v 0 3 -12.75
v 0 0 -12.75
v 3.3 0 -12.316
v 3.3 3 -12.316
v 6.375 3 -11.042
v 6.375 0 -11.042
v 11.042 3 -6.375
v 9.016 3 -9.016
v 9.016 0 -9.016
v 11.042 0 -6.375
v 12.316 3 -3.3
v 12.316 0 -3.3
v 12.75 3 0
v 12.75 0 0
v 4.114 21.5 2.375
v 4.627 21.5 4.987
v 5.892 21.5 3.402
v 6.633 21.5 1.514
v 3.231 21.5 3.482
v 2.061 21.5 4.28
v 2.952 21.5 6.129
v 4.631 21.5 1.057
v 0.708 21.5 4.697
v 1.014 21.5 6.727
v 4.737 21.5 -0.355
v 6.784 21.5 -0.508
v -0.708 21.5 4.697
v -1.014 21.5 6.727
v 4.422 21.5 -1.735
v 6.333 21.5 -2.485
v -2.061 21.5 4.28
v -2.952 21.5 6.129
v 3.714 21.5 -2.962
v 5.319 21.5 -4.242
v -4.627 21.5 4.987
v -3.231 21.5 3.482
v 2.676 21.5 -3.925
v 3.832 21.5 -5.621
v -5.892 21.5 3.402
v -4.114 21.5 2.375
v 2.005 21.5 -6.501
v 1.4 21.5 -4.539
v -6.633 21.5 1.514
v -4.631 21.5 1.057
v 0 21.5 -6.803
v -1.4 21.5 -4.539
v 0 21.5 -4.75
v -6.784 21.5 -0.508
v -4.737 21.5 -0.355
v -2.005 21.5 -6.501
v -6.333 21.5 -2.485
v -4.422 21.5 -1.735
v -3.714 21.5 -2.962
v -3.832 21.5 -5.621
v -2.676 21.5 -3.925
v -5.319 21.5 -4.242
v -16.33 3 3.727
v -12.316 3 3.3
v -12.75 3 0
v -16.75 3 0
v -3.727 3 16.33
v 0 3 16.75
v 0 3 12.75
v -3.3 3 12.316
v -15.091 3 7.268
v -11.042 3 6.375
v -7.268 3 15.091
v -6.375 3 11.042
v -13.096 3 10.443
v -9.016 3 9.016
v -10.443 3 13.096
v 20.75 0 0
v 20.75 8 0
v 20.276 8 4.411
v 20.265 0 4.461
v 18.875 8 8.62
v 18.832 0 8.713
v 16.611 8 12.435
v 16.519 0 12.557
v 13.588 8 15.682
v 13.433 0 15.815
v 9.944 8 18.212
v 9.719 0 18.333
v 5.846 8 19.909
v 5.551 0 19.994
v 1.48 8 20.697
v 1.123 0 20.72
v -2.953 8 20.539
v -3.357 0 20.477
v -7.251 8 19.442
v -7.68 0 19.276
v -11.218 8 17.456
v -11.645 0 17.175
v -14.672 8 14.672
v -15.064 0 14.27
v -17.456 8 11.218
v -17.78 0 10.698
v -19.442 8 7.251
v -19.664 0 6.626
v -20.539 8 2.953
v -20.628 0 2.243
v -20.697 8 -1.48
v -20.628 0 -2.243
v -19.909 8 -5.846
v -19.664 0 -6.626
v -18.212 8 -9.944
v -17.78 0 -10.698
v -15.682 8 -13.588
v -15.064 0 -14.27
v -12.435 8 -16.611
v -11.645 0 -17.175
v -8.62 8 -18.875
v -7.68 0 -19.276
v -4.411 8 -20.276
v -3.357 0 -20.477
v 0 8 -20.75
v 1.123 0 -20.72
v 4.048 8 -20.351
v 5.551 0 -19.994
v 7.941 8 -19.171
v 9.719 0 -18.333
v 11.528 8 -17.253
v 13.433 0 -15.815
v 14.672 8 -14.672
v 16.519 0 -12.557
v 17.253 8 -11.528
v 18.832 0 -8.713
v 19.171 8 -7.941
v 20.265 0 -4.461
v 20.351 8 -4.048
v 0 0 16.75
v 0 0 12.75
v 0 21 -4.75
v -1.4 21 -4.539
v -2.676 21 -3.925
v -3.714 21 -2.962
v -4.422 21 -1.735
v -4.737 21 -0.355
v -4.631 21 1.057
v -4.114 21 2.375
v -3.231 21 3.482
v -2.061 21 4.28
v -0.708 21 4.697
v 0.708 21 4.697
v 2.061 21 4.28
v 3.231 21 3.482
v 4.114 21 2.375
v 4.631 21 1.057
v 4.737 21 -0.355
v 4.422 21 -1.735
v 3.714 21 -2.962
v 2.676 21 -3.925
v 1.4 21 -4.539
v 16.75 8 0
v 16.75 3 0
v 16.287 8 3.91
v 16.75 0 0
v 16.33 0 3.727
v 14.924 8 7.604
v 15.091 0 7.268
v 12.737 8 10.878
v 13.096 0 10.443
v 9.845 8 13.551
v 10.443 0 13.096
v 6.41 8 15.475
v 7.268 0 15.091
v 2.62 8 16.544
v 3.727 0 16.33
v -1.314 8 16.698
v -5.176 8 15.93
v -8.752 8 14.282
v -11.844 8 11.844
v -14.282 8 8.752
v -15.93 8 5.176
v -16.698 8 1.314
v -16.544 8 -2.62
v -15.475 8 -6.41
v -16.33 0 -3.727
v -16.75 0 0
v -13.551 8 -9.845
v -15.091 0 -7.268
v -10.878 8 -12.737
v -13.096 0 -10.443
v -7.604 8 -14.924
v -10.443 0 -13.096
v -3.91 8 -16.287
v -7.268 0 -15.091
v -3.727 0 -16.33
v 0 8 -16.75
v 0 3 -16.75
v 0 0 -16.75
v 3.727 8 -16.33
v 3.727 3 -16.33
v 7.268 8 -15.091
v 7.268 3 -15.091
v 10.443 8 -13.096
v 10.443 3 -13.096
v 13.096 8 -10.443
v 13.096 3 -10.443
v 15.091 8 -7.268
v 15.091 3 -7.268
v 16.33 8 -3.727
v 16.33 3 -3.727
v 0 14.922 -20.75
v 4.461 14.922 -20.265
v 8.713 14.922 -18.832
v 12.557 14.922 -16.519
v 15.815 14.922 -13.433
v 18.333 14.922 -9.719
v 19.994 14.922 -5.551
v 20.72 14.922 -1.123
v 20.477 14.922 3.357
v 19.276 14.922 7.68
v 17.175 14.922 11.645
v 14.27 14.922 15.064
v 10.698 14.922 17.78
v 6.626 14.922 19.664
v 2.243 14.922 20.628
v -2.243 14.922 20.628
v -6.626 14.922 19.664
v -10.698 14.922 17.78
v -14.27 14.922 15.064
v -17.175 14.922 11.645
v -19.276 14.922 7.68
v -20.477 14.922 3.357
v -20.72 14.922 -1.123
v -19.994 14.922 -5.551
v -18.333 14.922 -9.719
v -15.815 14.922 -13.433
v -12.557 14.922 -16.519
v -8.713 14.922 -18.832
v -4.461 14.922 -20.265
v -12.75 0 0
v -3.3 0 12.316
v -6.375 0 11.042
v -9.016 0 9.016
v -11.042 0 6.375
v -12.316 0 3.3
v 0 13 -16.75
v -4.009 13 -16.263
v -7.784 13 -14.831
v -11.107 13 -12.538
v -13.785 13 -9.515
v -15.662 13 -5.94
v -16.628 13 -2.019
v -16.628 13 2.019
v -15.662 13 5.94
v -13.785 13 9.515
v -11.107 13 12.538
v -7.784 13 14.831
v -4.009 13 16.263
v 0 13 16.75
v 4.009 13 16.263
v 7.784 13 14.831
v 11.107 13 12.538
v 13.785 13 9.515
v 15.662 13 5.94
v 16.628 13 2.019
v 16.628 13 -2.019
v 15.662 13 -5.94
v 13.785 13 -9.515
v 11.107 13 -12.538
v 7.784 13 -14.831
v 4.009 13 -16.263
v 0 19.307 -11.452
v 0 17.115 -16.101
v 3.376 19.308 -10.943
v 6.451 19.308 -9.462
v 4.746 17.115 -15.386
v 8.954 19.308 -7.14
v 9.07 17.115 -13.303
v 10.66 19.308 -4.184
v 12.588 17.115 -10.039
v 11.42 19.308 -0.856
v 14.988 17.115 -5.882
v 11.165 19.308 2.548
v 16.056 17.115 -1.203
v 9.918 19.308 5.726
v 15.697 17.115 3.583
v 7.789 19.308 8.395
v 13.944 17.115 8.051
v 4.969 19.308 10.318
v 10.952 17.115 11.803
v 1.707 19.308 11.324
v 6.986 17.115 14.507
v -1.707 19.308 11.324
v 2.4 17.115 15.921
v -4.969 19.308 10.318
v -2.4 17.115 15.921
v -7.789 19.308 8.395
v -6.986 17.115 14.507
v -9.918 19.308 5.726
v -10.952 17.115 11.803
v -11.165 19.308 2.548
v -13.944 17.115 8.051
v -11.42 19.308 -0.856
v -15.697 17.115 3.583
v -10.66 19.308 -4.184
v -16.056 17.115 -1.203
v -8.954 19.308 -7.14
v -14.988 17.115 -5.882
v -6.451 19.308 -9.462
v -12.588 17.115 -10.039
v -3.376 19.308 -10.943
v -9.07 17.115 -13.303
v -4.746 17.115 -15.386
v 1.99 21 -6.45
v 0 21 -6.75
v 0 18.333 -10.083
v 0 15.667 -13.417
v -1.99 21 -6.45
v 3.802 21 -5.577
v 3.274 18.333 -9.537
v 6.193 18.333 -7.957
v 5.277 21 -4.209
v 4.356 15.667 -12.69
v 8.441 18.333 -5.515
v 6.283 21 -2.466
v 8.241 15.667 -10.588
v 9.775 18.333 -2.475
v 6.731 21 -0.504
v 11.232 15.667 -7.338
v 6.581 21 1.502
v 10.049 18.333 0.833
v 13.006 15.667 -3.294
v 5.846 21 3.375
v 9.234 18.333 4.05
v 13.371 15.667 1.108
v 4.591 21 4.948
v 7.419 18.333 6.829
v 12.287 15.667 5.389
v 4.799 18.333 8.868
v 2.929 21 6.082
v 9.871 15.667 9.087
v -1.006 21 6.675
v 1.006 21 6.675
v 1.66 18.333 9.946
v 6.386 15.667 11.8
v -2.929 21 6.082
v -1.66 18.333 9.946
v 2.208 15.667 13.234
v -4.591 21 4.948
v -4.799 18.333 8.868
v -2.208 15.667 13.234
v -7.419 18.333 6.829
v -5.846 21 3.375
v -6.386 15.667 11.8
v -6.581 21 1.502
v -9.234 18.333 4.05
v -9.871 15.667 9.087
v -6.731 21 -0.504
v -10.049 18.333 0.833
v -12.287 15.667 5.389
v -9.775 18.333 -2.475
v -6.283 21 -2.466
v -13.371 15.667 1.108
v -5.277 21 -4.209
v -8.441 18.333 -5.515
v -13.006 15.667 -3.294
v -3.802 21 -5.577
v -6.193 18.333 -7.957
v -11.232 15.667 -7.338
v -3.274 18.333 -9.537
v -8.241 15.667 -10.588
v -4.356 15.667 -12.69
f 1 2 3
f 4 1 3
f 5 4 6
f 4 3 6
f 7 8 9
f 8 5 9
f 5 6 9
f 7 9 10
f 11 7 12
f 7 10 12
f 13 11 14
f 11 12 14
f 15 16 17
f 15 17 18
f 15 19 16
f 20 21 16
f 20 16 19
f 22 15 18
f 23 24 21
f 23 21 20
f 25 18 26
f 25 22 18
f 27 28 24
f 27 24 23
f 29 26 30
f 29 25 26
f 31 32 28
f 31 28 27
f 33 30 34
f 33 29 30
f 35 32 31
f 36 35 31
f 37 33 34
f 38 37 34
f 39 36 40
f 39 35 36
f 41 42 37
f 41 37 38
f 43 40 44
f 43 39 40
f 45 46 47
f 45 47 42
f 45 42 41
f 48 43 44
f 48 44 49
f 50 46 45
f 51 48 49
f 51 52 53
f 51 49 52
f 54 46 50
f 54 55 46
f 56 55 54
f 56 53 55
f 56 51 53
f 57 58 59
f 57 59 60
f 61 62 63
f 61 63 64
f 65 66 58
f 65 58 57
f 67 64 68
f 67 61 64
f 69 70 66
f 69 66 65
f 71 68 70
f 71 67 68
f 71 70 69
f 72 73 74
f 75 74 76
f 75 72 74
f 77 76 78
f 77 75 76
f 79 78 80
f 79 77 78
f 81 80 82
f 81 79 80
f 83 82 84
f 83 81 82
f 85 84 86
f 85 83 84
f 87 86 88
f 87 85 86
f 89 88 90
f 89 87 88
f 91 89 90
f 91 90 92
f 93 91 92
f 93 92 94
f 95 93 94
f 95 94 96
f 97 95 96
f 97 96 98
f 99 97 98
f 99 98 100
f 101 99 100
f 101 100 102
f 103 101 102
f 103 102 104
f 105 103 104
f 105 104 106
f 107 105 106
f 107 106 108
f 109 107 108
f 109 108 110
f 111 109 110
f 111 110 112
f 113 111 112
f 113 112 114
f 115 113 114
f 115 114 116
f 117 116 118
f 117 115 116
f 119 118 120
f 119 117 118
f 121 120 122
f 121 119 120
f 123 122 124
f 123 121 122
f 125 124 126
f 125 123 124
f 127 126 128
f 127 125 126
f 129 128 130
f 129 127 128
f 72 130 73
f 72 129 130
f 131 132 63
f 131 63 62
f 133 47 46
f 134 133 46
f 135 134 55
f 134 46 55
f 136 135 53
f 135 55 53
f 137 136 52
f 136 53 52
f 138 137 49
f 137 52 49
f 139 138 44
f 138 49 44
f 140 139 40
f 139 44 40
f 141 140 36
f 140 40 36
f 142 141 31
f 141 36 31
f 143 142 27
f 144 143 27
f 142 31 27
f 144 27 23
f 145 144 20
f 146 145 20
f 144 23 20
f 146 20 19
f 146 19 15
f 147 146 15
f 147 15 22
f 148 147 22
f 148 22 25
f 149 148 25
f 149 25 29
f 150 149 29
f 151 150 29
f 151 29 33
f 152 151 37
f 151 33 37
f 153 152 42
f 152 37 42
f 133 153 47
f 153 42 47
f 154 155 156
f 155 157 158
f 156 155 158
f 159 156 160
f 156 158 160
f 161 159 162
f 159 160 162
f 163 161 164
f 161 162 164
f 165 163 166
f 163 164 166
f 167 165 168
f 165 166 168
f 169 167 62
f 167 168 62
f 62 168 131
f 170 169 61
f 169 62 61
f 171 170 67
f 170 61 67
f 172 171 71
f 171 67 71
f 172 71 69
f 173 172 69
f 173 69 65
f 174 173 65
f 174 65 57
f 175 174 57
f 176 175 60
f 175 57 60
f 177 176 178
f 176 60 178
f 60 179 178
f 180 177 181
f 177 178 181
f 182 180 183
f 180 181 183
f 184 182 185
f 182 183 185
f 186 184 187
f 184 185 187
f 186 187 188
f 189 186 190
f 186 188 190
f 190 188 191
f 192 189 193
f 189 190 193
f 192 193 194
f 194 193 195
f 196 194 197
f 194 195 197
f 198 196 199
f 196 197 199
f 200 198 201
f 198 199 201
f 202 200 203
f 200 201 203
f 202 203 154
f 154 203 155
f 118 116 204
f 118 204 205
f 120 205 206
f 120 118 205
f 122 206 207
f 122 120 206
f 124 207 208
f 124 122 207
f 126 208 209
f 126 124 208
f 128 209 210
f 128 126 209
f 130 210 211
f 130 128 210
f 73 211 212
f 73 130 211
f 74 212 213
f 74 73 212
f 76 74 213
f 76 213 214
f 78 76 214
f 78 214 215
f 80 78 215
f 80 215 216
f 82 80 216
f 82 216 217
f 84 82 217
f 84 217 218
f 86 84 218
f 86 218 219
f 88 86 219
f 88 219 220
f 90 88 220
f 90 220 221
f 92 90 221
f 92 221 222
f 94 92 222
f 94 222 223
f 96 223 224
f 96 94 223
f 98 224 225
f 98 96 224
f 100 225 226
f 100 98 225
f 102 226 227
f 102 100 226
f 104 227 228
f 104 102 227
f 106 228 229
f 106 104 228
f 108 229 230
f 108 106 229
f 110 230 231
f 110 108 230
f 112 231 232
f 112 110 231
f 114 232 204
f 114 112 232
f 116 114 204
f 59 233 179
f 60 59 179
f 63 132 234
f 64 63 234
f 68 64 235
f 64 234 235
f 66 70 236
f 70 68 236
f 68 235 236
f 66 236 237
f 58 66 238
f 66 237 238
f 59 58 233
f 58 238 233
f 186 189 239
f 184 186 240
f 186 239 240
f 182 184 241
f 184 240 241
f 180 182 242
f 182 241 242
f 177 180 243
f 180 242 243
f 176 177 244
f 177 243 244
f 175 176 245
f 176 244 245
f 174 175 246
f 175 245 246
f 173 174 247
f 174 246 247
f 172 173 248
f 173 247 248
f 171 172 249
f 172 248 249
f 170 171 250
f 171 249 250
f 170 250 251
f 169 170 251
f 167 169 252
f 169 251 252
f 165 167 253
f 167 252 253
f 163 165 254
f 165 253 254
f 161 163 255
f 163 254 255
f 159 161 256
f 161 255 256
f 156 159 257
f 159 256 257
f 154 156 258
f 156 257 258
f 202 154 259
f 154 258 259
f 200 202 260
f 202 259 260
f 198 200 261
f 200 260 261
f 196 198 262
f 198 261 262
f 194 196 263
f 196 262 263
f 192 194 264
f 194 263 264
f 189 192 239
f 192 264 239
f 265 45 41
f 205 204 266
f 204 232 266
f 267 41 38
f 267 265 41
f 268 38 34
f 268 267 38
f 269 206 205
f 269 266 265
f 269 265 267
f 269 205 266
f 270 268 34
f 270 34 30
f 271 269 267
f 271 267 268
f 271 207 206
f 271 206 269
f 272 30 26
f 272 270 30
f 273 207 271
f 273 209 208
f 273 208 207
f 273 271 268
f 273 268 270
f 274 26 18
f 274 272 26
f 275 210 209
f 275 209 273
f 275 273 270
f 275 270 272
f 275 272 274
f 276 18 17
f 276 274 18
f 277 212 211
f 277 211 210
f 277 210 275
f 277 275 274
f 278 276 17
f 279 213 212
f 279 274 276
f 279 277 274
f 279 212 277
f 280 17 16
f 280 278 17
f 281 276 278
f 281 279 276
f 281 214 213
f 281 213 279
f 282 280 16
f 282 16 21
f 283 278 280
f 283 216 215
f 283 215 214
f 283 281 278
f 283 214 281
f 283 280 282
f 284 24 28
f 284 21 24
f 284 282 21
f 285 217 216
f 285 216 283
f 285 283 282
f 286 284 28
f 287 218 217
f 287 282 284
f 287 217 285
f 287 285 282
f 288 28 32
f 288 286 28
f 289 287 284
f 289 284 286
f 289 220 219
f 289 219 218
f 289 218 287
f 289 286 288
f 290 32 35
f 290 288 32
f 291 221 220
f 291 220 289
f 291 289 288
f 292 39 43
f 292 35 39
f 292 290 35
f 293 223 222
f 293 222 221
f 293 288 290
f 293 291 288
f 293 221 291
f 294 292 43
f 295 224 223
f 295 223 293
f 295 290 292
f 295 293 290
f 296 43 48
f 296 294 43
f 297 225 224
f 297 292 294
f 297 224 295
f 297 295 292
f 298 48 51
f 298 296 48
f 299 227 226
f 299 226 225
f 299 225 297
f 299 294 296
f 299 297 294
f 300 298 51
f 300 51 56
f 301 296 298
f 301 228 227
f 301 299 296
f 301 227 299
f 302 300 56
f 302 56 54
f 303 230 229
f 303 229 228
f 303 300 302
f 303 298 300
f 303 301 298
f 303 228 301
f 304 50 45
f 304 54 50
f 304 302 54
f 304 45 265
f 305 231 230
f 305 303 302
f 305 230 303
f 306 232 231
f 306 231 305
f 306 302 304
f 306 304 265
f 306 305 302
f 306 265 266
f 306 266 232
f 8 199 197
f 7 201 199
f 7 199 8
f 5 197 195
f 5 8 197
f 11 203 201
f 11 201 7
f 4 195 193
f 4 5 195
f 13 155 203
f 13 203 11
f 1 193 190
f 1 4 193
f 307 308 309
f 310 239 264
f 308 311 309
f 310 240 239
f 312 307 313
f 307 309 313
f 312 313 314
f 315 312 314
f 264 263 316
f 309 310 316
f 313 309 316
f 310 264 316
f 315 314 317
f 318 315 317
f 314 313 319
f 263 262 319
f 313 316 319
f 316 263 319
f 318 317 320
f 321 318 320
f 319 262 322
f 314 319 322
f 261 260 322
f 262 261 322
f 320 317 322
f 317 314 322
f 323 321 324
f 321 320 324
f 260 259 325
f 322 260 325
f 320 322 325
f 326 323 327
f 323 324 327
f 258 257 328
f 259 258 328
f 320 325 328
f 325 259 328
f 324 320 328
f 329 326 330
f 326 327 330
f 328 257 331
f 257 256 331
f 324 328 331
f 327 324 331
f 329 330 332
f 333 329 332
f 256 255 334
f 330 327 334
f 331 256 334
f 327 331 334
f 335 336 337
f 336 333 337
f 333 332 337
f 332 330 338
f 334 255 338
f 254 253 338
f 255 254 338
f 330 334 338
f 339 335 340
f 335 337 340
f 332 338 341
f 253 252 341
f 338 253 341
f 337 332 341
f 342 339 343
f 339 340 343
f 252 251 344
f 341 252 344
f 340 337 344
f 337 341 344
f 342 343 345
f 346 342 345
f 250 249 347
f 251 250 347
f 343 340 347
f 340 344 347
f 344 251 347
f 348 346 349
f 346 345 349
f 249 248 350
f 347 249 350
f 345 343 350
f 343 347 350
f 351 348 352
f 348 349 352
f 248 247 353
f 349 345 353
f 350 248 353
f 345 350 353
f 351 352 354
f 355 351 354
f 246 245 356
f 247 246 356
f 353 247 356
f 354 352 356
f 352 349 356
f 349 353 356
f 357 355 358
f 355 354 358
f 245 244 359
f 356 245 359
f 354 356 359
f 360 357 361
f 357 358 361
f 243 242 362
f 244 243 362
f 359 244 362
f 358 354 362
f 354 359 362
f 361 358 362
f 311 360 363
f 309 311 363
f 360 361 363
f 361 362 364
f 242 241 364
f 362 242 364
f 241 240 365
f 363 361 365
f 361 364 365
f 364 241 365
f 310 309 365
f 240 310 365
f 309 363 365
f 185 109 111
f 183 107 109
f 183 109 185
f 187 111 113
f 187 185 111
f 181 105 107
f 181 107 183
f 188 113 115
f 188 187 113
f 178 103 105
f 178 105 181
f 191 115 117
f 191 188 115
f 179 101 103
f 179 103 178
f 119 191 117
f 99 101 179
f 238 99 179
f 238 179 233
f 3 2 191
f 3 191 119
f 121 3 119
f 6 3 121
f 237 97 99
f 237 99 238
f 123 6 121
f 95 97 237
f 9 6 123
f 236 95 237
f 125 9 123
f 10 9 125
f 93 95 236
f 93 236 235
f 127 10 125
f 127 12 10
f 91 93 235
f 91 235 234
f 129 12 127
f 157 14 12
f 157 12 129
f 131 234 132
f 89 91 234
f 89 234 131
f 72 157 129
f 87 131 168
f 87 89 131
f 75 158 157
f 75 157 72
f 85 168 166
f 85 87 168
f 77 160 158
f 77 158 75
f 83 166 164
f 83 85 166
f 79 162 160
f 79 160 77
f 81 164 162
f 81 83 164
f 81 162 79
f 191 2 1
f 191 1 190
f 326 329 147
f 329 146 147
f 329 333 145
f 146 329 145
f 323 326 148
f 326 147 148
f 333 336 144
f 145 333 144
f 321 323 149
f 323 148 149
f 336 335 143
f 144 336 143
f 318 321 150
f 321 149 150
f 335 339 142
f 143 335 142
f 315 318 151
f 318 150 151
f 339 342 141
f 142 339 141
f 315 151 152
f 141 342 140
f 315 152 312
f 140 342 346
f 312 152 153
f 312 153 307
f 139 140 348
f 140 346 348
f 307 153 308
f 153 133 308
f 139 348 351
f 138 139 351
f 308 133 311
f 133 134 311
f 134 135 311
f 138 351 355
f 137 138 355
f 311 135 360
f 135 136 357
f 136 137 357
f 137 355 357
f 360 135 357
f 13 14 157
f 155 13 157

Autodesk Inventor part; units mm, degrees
ref_plane "YZ Plane" through (0, 0, 0) normal (1, 0, 0) x (0, 1, 0)
ref_plane "XZ Plane" through (0, 0, 0) normal (0, 1, 0) x (-1, 0, 0)
ref_plane "XY Plane" through (0, 0, 0) normal (0, 0, 1) x (1, 0, 0)
sketch "Sketch1" plane through (0, 0, 0) normal (0, 1, 0) x (-1, 0, 0)
  line L0 (-12.75, 0) -> (-16.75, 0)
  line L1 (0, 12.75) -> (0, 16.75)
  line L2 (0, -12.75) -> (0, -16.75)
  line L3 (12.75, 0) -> (16.75, 0)
  arc A0 (-12.75, 0) -> (0, -12.75) centre (0, 0) ccw
  arc A1 (12.75, 0) -> (0, 12.75) centre (0, 0) ccw
  arc A2 (-16.75, 0) -> (0, -16.75) centre (0, 0) ccw
  arc A3 (16.75, 0) -> (0, 16.75) centre (0, 0) ccw
extrude "Extrusion1" add sketch "Sketch1" along normal blind 3
sketch "Sketch2" plane through (0, 0, 0) normal (0, -1, 0) x (1, 0, 0)
  circle A0 centre (0, 0) radius 16.75
  arc A1 (0, -16.75) -> (16.75, 0) centre (0, 0) ccw projected
  circle A2 centre (0, 0) radius 20.75
  arc A3 (0, -16.75) -> (16.75, 0) centre (0, 0) ccw projected
  dimension "d4" = 4
  dimension "d5" = 33.5
extrude "Extrusion2" add sketch "Sketch2" against normal blind 8
sketch "Sketch3" plane through (0, 0, 0) normal (1, 0, 0) x (0, 1, 0)
  line L0 (8, -20.75) -> (8, 20.75) projected
  line L1 (8, 16.75) -> (8, -16.75) projected
  line L2 (8, 16.75) -> (8, -16.75) projected
  line L3 (8, -16.75) -> (13, -16.75)
  line L4 (13, -16.75) -> (21, -6.75)
  line L5 (8, -20.75) -> (8, 20.75) projected
  line L6 (3, 0) -> (3, -12.75) projected
  line L7 (0, -12.75) -> (3, -12.75) projected
  line L8 (21, -6.75) -> (21, -4.75)
  line L9 (21.5, -4.75) -> (21.5, -6.8032)
  line L10 (14.9225, -20.75) -> (8, -20.75)
  line L11 (14.9225, -20.75) -> (21.5, -6.8032)
  line L12 (8, -16.75) -> (8, -20.75)
  line L13 (21, -4.75) -> (21.5, -4.75)
  line L14 (-4.3, 0) -> (25.8, 0) projected
  point P0 (0, 0)
  dimension "d8" = 5
  dimension "d9" = 8
  dimension "d10" = 6
  dimension "d11" = 2
  dimension "d12" = 0.5
revolve "Revolution1" add sketch "Sketch3" angle 360 about axis through (0, -10, 0) along (0, 1, 0)
properties part number "Parte superior"
